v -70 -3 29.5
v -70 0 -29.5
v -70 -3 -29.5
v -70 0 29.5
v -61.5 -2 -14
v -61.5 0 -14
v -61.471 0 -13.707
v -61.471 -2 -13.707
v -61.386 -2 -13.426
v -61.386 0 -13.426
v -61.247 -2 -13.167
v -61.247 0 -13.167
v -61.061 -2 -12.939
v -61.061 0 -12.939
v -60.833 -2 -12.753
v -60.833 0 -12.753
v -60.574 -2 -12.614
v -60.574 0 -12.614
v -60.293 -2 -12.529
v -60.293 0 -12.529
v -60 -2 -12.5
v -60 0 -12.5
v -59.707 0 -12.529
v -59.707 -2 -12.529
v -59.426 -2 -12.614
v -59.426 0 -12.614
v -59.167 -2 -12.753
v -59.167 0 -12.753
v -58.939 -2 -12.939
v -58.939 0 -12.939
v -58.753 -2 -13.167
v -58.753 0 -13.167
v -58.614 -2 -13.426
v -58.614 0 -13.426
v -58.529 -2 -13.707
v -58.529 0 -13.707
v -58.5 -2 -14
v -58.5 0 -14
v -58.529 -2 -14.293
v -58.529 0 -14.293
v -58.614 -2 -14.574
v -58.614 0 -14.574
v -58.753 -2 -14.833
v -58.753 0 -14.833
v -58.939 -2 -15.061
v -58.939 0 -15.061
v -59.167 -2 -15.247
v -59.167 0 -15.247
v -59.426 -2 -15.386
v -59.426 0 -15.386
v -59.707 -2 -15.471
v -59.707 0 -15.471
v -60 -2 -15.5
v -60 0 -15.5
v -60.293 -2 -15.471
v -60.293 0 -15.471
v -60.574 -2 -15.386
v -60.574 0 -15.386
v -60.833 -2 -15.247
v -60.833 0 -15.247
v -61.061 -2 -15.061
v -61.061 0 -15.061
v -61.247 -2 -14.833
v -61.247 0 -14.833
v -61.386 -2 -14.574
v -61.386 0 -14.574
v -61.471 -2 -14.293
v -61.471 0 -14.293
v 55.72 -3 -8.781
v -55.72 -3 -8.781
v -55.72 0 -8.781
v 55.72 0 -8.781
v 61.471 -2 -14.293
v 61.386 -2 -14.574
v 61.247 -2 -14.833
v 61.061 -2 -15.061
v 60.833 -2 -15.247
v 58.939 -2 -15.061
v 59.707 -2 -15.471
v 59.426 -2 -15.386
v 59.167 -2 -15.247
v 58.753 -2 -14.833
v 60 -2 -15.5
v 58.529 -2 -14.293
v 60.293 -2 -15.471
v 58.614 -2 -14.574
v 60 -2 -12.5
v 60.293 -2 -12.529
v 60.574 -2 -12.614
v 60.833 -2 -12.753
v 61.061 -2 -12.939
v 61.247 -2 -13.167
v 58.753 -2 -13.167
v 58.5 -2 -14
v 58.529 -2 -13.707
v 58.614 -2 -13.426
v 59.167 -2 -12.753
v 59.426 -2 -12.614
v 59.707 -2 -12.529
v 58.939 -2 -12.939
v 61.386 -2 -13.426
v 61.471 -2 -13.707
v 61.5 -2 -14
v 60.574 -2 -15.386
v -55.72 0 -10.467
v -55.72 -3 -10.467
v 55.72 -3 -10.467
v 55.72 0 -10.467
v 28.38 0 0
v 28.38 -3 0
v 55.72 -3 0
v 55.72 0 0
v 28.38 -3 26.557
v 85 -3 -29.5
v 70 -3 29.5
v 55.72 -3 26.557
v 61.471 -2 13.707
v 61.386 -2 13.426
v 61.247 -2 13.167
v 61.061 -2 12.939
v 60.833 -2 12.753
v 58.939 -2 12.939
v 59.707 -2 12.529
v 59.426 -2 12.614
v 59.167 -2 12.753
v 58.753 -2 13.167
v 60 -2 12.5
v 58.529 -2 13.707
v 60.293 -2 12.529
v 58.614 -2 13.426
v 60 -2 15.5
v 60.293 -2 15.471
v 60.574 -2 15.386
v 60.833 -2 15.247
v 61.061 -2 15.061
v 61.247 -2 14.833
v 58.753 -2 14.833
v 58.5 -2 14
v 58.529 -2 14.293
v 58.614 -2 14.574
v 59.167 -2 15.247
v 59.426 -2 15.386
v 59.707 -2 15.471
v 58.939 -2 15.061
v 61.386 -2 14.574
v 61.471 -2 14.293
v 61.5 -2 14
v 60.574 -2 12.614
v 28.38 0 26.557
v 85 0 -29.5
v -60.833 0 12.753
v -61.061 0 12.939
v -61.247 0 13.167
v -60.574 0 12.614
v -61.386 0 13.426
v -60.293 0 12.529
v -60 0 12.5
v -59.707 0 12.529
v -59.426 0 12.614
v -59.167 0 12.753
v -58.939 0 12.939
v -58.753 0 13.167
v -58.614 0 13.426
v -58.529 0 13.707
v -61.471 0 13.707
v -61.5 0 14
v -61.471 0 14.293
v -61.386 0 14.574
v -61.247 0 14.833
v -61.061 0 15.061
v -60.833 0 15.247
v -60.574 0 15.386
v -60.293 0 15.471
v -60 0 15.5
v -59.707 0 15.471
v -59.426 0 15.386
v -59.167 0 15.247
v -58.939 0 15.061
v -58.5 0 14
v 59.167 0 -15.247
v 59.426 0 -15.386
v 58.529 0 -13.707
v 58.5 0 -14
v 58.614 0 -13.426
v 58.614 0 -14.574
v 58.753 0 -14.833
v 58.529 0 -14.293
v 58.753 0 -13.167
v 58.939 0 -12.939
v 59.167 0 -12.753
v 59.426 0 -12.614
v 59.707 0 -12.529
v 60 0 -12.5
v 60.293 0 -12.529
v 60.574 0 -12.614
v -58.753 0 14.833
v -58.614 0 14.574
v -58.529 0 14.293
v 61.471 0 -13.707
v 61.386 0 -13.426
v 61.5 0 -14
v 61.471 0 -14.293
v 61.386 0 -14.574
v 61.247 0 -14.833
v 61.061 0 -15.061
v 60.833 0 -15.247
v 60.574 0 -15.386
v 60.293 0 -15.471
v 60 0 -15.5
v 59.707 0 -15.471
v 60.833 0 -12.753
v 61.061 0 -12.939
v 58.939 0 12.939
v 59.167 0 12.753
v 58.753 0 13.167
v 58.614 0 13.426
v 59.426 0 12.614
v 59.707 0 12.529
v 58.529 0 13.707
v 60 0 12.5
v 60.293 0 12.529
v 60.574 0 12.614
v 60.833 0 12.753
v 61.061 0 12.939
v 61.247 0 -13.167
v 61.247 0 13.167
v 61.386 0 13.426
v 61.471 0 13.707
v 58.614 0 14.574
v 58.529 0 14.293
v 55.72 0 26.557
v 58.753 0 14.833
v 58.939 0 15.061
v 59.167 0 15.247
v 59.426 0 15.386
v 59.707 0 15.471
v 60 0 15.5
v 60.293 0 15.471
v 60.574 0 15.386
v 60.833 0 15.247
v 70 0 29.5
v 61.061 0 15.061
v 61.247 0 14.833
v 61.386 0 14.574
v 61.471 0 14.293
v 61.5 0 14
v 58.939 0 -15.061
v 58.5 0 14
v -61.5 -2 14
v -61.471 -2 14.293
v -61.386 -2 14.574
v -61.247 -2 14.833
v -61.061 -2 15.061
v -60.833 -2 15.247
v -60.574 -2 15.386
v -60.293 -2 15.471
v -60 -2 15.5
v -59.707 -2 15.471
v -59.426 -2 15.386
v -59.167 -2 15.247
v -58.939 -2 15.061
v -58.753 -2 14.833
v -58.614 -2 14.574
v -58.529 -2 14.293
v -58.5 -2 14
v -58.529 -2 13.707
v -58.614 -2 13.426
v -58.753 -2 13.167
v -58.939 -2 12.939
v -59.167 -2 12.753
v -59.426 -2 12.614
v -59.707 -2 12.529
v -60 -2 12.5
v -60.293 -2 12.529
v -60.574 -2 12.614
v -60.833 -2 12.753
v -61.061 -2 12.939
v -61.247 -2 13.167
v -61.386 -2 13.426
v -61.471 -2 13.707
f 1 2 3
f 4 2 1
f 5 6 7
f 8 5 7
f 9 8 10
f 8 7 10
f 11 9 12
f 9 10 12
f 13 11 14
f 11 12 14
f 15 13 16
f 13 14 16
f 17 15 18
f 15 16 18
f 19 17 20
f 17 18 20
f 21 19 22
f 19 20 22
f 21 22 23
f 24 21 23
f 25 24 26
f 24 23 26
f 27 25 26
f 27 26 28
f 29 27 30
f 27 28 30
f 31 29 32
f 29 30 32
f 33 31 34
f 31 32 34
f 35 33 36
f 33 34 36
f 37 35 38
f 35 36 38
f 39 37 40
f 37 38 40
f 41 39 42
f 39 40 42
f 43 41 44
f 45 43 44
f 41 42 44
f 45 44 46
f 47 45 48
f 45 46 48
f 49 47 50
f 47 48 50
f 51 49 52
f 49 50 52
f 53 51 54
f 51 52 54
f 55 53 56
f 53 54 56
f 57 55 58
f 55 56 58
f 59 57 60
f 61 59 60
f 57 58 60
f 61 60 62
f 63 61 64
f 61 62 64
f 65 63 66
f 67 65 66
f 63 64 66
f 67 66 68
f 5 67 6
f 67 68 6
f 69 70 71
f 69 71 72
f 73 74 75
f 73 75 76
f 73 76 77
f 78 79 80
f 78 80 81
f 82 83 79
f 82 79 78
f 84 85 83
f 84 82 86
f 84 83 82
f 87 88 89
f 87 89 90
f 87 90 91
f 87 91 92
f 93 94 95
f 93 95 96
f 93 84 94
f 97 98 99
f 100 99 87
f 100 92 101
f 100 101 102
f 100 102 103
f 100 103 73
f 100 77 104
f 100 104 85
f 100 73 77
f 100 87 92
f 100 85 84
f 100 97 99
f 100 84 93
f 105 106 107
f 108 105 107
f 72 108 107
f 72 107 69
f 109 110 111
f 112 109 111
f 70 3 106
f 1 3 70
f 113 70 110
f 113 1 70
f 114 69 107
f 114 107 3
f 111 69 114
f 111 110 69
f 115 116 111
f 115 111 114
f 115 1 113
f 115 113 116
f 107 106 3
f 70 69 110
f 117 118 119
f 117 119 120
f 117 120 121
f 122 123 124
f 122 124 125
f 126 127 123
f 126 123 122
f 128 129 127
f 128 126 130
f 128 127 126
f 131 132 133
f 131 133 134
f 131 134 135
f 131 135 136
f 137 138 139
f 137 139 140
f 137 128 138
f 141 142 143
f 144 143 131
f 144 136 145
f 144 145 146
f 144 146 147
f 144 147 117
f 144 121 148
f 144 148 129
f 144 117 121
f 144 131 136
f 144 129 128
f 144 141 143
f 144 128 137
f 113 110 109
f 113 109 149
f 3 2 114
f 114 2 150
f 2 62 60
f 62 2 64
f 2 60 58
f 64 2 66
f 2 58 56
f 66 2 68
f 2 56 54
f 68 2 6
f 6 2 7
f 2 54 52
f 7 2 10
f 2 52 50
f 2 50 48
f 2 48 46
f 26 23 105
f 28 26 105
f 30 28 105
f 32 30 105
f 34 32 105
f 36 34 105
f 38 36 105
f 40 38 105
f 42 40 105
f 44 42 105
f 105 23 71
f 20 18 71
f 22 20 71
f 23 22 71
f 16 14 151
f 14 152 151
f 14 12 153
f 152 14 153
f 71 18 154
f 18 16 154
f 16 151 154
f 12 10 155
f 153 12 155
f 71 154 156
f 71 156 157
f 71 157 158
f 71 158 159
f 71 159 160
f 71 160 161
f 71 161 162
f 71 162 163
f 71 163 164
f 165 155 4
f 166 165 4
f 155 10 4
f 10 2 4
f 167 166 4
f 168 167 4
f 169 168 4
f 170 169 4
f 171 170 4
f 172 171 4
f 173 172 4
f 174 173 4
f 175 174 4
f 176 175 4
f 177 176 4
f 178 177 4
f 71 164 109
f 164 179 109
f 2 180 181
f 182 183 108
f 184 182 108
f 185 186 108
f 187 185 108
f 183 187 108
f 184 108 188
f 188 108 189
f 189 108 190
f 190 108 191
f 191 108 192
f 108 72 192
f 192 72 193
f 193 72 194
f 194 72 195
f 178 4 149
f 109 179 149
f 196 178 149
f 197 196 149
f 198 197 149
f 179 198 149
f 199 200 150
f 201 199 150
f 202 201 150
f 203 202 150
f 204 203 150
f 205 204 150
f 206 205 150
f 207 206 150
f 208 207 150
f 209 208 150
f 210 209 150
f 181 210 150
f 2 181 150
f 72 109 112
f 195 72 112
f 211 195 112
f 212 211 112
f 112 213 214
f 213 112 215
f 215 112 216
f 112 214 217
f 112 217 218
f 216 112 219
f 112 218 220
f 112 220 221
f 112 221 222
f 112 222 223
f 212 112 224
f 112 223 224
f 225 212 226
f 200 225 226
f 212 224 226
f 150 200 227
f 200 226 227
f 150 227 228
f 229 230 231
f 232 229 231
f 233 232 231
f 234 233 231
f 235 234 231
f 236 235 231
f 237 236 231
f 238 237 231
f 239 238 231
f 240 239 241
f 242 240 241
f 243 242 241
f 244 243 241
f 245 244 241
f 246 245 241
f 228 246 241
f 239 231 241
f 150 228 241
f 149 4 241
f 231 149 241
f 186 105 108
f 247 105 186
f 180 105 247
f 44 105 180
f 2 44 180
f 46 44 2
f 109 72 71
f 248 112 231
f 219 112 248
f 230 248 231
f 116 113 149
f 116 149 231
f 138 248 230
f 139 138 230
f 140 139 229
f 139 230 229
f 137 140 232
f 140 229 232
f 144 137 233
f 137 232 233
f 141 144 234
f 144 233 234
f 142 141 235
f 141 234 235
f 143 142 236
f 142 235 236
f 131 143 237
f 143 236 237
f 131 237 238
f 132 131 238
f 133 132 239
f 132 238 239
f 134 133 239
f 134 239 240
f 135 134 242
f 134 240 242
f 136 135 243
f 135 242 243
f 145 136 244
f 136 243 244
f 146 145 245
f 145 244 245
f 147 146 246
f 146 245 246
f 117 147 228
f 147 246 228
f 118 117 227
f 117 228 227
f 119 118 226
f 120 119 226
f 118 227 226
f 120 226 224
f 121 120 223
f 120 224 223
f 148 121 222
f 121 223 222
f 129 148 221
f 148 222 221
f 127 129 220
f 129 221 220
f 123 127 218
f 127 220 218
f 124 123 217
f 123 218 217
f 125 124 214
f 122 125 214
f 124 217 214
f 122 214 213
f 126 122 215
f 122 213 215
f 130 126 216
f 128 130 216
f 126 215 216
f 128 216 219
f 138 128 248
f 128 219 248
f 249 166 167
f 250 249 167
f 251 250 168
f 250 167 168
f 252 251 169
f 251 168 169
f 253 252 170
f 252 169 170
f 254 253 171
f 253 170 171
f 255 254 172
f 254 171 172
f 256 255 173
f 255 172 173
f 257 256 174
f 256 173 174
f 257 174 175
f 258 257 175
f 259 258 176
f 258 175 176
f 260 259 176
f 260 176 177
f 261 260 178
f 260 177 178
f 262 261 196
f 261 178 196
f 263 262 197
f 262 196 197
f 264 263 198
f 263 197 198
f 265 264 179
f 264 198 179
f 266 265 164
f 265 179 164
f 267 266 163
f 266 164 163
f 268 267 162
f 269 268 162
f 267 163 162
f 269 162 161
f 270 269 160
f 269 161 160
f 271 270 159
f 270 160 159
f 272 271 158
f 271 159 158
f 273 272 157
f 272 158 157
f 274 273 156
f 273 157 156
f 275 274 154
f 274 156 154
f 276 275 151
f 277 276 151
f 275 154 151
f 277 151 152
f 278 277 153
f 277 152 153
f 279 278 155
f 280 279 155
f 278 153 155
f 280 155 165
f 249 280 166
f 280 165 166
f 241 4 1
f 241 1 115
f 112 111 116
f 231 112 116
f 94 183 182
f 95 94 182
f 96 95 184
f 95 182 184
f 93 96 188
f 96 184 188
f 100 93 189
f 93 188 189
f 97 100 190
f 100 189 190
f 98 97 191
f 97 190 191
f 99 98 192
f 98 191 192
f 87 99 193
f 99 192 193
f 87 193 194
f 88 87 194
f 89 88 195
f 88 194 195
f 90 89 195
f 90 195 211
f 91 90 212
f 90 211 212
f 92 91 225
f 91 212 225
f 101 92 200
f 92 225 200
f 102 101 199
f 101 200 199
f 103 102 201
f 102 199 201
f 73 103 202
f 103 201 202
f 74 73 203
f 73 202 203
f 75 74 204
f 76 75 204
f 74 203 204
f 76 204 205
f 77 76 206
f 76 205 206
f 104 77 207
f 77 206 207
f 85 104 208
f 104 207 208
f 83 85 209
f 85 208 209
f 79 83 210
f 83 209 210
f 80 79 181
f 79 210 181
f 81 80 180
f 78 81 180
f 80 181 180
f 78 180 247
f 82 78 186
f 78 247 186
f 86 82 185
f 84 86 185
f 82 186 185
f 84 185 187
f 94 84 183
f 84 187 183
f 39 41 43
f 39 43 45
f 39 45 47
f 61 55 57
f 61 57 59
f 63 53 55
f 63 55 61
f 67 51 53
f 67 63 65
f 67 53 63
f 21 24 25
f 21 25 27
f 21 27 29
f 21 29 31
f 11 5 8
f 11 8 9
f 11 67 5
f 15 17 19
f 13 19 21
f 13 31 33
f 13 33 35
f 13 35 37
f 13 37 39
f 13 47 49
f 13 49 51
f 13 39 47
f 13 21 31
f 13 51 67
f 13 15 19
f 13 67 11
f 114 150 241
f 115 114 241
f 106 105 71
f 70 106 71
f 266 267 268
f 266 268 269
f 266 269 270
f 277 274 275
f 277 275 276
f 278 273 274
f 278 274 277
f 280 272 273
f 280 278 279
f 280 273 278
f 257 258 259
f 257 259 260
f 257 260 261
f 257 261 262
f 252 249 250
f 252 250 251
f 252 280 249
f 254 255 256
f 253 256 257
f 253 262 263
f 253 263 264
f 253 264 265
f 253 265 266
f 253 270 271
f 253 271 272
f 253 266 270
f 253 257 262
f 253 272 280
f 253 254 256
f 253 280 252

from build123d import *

# Parameters (mm, degrees)
F0_W     = 140
F0_H     = 59
F1_DEPTH = 3
F2_W     = 111.440674
F2_H     = 1.685995
F3_DEPTH = 25
F4_W     = 27.34
F4_H     = 19
F5_DEPTH = 25
F6_R     = 1.5
F7_DEPTH = 2
F8_W     = 27.34
F8_H     = 26.557377
F9_DEPTH = 25


with BuildPart() as f1:
    # F0 (on Front) → F1 (new body)
    with BuildSketch(Plane.XZ):
        Rectangle(F0_W, F0_H)
        Polygon((85, -29.5), (70, 29.5), (70, -29.5), align=None)
    extrude(amount=F1_DEPTH)

    # F2 (on face) → F3 (cut)
    with BuildSketch(Plane.XZ.offset(3)):
        with Locations((0, -9.62422)):
            Rectangle(F2_W, F2_H)
    extrude(amount=-F3_DEPTH, mode=Mode.SUBTRACT)

    # F4 (on face) → F5 (cut)
    with BuildSketch(Plane.XZ.offset(3)):
        with Locations((42.050337, 12.718777)):
            Rectangle(F4_W, F4_H)
    extrude(amount=-F5_DEPTH, mode=Mode.SUBTRACT)

    # F6 (on face) → F7 (cut)
    with BuildSketch(Plane(origin=(0, 0, 0), x_dir=(-1, 0, 0), z_dir=(0, 1, 0))):
        with Locations((60, 14)):
            Circle(F6_R)
        with Locations((-60, 14)):
            Circle(F6_R)
        with Locations((60, -14)):
            Circle(F6_R)
        with Locations((-60, -14)):
            Circle(F6_R)
    extrude(amount=-F7_DEPTH, mode=Mode.SUBTRACT)

    # F8 (on face) → F9 (cut)
    with BuildSketch(Plane.XZ.offset(3)):
        with Locations((42.050337, 13.278688)):
            Rectangle(F8_W, F8_H)
    extrude(amount=-F9_DEPTH, mode=Mode.SUBTRACT)


solid = f1.part
